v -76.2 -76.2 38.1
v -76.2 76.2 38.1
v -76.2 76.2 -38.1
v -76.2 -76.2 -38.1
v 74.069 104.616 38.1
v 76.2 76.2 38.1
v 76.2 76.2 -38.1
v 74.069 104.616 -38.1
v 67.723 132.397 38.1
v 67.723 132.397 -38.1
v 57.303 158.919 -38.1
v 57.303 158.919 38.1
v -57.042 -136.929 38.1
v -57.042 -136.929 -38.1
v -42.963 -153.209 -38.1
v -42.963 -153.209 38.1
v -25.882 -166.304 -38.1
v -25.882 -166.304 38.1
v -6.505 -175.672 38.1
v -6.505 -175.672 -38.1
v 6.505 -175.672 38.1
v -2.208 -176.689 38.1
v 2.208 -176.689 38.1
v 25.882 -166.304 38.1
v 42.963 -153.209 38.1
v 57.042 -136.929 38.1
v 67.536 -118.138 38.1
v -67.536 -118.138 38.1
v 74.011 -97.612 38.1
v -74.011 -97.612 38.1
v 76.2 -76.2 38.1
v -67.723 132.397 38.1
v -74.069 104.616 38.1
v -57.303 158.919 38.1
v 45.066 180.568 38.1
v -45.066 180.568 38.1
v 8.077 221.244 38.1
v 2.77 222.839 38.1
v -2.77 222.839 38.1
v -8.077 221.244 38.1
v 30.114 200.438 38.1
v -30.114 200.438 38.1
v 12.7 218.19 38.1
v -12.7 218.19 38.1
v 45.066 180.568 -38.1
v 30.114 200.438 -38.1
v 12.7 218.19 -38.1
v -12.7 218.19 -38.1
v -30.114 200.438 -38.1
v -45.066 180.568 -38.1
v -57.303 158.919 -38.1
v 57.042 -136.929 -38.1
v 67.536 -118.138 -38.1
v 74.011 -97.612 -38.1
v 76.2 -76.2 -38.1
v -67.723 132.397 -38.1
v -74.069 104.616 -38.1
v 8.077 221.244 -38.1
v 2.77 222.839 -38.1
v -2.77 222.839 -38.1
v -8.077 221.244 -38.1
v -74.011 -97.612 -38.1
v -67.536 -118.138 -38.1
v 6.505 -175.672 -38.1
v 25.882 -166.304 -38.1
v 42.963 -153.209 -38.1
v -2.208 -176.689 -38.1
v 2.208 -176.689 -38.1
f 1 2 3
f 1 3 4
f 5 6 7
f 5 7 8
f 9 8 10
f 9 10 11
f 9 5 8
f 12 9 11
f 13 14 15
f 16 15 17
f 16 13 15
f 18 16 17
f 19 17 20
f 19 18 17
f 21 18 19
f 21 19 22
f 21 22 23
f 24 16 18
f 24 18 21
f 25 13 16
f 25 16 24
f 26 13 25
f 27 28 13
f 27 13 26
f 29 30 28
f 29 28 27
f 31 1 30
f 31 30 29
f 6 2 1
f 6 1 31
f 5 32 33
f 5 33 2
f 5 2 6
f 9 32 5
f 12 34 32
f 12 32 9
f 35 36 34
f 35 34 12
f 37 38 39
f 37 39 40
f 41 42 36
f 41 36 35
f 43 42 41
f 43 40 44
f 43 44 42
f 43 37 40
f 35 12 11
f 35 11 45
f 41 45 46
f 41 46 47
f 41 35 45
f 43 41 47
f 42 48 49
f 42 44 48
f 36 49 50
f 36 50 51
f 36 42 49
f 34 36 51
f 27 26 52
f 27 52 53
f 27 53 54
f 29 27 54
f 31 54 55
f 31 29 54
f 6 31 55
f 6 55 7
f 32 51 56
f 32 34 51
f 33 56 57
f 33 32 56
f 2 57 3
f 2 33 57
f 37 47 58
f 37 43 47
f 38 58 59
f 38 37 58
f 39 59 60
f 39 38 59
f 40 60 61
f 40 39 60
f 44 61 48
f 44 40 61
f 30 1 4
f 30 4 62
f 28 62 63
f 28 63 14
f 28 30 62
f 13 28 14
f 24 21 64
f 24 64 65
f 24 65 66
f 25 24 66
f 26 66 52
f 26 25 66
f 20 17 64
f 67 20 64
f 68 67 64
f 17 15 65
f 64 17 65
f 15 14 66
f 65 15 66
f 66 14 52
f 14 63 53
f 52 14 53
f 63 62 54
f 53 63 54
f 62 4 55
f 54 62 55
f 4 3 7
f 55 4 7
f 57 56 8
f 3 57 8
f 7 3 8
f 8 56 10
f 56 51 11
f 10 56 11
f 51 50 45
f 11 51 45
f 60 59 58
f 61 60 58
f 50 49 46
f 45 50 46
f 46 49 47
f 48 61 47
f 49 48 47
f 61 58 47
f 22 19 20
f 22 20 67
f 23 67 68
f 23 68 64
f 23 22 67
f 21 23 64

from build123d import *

# Parameters (mm, degrees)
F1_DEPTH = 38.1


with BuildPart() as f1:
    # F0 (on Top) → F1 (new body, symmetric)
    with BuildSketch(Plane.XY):
        with BuildLine():
            ThreePointArc((-57.303448, 158.919445), (-71.415787, 118.625188), (-76.2, 76.2))
            Line((-76.2, 76.2), (-76.2, -76.2))
            ThreePointArc((-76.2, -76.2), (-71.296996, -108.039645), (-57.042274, -136.929182))
            ThreePointArc((-57.042274, -136.929182), (-34.756607, -160.191845), (-6.504878, -175.672228))
            ThreePointArc((-6.504878, -175.672228), (0, -176.817227), (6.504878, -175.672228))
            ThreePointArc((6.504878, -175.672228), (34.756607, -160.191845), (57.042274, -136.929182))
            ThreePointArc((57.042274, -136.929182), (71.296996, -108.039645), (76.2, -76.2))
            Line((76.2, -76.2), (76.2, 76.2))
            ThreePointArc((76.2, 76.2), (71.415787, 118.625188), (57.303448, 158.919445))
            ThreePointArc((57.303448, 158.919445), (37.914532, 190.746873), (12.7, 218.190317))
            ThreePointArc((12.7, 218.190317), (0, 223.041285), (-12.7, 218.190317))
            ThreePointArc((-12.7, 218.190317), (-37.914532, 190.746873), (-57.303448, 158.919445))
        make_face()
    extrude(amount=F1_DEPTH, both=True)


solid = f1.part
